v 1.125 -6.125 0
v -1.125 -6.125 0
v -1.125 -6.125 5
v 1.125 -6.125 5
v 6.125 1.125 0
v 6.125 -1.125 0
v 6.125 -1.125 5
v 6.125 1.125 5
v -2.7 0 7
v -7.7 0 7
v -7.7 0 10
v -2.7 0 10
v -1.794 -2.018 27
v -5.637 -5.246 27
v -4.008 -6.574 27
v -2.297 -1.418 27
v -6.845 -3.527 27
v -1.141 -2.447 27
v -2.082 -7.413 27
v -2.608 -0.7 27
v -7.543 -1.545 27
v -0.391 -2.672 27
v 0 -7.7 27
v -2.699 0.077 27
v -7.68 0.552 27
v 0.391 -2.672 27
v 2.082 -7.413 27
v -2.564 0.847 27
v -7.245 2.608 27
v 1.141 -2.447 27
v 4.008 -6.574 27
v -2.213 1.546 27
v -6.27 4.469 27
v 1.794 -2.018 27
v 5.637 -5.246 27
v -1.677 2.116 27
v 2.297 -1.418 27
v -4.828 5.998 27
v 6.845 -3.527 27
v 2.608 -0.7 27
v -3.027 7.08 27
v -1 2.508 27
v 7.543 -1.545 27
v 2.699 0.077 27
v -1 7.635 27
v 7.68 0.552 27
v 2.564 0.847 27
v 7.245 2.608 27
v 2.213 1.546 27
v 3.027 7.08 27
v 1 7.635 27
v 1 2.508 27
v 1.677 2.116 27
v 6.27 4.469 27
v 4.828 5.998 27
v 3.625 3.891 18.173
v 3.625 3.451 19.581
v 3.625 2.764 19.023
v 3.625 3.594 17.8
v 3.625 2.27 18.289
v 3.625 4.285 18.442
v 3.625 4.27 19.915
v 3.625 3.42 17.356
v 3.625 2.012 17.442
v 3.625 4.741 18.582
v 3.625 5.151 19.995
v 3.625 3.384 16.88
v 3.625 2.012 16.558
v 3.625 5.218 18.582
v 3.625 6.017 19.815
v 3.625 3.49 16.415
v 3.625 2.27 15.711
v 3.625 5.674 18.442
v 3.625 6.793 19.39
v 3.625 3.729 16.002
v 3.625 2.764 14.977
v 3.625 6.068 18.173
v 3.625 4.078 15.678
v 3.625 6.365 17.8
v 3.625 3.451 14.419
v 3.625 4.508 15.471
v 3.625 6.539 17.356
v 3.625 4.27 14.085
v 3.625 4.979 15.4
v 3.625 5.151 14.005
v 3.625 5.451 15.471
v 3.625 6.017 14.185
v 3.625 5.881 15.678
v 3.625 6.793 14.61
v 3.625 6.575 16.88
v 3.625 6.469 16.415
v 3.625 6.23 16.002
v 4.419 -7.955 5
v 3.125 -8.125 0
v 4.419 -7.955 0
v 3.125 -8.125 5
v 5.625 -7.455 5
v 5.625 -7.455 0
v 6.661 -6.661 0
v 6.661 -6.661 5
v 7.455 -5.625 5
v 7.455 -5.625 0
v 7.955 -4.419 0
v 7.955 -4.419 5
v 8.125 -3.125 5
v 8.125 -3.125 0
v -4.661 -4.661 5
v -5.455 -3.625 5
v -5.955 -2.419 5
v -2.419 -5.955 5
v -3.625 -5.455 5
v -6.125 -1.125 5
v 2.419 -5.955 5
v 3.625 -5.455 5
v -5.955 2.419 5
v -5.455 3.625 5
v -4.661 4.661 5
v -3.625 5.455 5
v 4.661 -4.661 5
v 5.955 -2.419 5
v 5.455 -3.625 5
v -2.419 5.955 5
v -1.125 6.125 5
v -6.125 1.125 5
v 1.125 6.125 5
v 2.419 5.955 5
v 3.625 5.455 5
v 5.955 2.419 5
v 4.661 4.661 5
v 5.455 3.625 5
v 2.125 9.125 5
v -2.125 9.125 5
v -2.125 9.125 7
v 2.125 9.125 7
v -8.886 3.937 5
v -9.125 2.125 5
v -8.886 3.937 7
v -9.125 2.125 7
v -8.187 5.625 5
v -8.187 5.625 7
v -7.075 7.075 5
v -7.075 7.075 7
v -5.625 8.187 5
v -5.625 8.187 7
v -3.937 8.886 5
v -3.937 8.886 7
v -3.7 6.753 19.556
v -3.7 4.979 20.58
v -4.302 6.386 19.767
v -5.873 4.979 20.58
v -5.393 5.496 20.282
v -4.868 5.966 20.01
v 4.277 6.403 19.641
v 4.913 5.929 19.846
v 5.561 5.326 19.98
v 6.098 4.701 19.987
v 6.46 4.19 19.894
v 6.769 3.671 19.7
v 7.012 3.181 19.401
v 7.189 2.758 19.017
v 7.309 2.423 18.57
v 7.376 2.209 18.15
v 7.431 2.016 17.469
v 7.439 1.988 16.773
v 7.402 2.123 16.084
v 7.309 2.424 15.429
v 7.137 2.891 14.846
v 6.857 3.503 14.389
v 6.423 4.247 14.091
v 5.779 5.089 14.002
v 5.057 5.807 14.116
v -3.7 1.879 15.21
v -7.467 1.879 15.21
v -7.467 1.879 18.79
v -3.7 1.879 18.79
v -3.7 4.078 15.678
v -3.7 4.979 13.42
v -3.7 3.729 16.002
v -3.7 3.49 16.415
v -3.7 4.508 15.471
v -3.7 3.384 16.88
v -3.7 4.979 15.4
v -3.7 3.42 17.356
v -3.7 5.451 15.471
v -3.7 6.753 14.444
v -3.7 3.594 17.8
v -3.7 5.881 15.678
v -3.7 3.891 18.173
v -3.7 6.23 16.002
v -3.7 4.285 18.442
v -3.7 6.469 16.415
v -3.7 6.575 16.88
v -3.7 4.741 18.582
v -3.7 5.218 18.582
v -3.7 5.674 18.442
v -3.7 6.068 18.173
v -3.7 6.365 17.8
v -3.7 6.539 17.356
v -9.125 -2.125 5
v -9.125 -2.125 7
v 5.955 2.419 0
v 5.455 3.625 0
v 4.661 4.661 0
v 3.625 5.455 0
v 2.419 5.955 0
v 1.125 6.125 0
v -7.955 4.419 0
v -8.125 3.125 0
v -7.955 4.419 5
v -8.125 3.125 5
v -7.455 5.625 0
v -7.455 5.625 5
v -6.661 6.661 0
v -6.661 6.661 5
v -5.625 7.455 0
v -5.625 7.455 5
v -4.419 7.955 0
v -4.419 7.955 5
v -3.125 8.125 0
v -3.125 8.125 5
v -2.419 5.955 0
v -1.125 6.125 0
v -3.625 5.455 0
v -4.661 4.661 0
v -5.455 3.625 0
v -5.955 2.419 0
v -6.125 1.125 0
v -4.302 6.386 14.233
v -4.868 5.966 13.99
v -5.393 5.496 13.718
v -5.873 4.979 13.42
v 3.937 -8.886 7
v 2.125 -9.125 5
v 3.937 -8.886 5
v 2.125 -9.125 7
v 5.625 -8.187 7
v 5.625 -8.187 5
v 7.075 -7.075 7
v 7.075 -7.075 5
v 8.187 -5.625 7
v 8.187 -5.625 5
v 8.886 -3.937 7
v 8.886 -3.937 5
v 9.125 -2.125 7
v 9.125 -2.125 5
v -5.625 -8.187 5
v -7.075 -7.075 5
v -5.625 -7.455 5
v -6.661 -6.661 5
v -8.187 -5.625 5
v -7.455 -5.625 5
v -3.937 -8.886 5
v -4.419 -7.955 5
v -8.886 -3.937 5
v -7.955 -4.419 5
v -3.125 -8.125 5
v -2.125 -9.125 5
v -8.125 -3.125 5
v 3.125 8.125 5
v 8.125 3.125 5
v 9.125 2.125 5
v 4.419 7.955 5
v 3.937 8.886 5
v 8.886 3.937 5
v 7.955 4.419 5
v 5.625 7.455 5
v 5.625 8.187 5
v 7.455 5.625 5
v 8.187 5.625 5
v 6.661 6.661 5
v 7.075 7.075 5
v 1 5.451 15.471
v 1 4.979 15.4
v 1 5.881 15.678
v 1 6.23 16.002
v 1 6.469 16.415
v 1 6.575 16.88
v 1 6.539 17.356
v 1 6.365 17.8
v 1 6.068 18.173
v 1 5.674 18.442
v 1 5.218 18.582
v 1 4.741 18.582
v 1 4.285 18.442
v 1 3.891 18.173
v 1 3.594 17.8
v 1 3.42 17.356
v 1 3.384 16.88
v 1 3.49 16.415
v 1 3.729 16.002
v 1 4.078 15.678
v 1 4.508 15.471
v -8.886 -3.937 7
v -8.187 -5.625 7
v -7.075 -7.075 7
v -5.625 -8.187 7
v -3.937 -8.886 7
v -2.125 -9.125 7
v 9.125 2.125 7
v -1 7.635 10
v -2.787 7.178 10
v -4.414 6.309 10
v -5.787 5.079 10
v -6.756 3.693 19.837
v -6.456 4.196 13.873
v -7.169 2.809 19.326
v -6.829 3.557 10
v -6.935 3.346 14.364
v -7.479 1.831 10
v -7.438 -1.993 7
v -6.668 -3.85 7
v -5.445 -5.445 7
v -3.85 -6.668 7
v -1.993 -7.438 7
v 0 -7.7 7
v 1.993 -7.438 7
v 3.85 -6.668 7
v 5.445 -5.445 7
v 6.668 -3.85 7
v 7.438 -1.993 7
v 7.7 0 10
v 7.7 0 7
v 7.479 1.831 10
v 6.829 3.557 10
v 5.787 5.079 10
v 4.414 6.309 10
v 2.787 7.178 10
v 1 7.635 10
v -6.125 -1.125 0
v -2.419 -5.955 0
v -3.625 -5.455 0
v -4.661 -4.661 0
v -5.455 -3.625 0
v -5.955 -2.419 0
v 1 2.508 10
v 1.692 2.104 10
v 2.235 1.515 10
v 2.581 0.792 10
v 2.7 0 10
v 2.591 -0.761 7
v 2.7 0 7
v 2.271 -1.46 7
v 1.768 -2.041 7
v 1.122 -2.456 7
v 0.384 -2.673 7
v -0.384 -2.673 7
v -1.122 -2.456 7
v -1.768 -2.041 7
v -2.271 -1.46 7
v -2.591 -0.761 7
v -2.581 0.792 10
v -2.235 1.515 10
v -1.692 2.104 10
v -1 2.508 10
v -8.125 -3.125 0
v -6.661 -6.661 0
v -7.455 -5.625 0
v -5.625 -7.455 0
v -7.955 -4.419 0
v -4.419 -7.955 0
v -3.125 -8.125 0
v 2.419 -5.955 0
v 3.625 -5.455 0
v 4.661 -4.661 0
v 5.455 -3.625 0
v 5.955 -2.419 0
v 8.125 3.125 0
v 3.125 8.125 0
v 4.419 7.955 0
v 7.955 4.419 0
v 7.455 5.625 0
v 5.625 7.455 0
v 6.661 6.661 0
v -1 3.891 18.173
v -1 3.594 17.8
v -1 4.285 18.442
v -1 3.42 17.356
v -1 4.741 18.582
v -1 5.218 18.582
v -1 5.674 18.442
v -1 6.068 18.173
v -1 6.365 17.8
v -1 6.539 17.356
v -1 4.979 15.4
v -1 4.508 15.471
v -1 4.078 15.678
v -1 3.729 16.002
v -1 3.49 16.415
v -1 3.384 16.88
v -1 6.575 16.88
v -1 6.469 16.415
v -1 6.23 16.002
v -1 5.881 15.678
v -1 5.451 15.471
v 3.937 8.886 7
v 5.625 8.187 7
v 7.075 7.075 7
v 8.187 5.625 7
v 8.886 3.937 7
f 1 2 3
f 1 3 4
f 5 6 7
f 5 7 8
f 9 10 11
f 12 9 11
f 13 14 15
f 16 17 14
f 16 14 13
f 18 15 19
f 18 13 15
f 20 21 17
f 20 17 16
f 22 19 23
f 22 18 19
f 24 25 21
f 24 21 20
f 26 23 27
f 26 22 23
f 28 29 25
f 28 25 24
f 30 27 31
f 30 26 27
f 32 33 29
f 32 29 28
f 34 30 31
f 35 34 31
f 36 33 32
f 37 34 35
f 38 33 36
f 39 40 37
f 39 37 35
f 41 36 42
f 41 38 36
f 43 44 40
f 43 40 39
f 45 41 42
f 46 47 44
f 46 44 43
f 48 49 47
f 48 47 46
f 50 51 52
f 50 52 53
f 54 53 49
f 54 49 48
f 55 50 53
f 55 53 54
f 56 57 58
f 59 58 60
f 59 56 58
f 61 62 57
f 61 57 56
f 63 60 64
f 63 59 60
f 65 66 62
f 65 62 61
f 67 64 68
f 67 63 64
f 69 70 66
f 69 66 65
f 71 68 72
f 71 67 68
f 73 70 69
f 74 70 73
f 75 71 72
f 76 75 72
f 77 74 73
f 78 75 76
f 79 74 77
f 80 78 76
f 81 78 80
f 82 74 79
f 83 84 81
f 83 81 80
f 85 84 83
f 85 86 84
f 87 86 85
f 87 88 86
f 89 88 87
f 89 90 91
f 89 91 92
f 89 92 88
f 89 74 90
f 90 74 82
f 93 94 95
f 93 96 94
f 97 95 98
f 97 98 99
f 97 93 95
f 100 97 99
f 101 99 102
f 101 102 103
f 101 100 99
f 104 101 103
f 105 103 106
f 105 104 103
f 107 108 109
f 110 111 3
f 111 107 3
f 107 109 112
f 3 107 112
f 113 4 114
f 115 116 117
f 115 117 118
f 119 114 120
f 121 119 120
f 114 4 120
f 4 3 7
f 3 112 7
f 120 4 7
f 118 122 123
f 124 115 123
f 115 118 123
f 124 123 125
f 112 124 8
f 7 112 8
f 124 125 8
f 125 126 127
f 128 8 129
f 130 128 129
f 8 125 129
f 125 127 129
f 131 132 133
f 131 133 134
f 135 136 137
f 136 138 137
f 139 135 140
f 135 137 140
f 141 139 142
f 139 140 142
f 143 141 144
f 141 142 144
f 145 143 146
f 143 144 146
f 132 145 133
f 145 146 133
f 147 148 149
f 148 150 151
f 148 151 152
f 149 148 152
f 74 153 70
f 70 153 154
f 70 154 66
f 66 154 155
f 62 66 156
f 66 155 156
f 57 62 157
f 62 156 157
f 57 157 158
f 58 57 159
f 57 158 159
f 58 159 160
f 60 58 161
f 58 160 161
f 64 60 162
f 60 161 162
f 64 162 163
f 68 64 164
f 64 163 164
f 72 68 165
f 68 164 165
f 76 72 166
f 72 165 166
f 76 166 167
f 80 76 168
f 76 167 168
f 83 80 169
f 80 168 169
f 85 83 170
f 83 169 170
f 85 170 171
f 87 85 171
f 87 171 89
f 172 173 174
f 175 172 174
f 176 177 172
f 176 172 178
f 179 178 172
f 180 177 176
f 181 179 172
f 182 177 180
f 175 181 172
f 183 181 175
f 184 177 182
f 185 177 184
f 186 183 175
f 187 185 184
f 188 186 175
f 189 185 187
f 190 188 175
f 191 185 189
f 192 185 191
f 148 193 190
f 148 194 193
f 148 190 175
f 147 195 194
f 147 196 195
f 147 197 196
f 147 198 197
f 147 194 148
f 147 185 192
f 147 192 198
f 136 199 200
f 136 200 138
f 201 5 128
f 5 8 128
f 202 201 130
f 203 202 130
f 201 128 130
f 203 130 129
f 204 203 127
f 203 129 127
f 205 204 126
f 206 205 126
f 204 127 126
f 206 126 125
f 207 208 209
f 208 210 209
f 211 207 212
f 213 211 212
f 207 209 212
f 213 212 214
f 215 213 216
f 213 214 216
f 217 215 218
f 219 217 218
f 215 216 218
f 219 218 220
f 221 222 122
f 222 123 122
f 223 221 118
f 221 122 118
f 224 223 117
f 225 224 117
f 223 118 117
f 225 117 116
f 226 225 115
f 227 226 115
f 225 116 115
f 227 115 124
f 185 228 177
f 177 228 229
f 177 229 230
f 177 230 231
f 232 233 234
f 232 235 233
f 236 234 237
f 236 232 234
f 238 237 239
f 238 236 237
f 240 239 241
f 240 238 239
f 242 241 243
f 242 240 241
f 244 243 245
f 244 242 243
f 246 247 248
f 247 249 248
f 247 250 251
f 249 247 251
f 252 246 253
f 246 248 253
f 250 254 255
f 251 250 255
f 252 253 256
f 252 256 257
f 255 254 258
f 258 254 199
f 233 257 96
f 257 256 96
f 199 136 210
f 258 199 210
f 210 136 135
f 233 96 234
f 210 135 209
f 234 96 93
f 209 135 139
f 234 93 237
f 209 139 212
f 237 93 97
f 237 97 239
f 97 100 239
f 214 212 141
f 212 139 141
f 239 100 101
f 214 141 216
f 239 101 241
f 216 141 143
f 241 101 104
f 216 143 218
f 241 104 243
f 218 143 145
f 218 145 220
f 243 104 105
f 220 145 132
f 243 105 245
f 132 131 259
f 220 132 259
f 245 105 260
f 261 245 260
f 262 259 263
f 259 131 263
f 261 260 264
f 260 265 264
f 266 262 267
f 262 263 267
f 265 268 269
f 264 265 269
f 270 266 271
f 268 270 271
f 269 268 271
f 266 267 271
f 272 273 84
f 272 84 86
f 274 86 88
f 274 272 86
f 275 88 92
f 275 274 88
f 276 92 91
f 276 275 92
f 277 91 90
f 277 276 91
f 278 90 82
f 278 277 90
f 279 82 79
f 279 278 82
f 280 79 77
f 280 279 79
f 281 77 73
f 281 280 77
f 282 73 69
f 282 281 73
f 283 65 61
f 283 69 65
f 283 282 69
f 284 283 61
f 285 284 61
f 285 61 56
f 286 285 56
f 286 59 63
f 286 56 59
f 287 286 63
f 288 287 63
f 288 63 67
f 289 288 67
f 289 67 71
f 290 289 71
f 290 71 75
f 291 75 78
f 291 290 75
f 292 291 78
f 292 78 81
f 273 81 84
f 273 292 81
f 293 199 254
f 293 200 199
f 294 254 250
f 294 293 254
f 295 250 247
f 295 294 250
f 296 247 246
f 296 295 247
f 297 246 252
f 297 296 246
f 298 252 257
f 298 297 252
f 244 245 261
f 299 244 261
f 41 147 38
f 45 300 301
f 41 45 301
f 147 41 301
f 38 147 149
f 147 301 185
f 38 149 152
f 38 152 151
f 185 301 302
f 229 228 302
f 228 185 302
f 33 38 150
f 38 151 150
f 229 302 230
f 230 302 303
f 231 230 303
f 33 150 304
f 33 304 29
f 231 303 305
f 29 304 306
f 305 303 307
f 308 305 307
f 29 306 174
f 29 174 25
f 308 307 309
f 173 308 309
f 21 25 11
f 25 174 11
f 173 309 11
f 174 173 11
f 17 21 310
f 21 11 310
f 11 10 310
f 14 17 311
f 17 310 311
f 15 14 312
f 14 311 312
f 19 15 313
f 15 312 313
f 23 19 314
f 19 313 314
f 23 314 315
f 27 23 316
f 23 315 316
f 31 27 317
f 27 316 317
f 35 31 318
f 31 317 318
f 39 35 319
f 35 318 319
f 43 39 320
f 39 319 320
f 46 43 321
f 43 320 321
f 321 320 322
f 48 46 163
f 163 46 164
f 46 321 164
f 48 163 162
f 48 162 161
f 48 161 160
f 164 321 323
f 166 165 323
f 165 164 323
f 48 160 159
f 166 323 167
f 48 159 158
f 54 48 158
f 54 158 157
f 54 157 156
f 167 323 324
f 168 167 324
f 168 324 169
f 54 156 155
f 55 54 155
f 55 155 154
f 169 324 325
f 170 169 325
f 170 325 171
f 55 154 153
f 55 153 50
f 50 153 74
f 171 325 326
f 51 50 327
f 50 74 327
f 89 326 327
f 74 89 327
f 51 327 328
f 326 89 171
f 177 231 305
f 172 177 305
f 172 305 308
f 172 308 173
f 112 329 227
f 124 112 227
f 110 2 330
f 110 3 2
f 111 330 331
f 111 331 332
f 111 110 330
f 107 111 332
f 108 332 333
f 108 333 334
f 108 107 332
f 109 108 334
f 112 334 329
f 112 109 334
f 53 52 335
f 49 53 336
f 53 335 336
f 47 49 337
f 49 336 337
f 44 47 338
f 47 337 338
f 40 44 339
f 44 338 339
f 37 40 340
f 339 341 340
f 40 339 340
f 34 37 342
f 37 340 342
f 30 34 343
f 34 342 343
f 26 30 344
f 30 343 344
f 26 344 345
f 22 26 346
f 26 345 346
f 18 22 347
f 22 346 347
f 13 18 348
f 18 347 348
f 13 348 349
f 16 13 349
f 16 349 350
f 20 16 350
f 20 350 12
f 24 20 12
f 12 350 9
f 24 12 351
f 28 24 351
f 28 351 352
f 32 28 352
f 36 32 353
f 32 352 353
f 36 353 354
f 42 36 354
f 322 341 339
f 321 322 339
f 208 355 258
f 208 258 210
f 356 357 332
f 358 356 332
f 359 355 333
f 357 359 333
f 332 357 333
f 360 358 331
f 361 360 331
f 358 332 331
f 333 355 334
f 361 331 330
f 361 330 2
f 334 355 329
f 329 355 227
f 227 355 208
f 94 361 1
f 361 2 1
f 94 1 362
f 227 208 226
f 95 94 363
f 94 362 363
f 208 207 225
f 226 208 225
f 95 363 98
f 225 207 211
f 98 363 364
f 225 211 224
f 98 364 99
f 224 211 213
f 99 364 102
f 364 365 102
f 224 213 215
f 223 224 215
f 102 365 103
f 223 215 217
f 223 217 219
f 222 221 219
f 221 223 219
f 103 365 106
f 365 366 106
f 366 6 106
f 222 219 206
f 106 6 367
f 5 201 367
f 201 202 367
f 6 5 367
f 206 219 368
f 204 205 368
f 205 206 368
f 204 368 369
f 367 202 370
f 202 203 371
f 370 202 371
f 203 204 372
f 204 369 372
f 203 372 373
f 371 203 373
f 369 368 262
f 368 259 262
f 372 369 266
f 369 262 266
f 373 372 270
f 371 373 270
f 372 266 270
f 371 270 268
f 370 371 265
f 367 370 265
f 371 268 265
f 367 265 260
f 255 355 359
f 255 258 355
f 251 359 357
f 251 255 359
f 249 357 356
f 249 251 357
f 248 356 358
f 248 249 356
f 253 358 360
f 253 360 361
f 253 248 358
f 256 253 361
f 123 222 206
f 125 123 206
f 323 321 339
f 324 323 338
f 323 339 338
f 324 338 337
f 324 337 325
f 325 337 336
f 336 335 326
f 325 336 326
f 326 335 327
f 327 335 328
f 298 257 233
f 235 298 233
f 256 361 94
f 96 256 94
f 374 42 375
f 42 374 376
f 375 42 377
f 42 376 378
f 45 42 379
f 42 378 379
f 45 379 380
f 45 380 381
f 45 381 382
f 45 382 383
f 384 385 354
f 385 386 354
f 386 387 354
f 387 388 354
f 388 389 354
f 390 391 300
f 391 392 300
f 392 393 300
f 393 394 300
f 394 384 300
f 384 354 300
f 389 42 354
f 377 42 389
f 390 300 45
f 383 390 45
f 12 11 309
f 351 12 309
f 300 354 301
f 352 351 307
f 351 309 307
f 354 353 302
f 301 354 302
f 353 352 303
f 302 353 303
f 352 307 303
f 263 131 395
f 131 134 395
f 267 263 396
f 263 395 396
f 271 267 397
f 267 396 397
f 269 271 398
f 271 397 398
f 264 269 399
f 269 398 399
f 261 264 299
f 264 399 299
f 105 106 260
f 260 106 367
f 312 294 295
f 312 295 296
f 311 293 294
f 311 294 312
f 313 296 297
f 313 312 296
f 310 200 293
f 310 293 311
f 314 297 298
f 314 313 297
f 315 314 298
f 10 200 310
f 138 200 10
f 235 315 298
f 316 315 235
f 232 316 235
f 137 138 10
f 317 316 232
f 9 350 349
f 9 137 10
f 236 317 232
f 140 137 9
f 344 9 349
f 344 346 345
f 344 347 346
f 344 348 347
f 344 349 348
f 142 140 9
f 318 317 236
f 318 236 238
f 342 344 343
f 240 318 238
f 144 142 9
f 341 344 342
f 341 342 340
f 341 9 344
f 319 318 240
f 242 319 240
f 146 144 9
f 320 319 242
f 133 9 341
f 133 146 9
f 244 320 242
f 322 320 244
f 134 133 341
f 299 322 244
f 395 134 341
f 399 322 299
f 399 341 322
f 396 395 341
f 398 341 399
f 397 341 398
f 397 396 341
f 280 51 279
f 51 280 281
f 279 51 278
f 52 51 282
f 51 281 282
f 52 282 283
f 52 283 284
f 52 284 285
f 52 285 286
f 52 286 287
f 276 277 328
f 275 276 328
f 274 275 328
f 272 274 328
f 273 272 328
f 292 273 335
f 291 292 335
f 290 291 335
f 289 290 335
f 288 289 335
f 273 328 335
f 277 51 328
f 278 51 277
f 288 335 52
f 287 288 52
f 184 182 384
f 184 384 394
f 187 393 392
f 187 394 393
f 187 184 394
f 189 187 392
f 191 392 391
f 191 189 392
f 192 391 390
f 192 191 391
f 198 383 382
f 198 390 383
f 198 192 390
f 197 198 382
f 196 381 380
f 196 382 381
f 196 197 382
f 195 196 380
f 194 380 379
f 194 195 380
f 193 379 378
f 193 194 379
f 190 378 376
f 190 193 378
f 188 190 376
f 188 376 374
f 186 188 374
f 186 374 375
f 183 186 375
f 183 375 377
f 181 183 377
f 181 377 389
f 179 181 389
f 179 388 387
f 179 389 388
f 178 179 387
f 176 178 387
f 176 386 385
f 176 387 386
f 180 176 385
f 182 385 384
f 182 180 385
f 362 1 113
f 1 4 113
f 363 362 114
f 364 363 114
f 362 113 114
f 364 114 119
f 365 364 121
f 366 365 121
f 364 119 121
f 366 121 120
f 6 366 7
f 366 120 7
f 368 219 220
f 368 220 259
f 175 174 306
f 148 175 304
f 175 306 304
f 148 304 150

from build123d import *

# Parameters (mm, degrees)
SKETCH1_W               = 16.25
SKETCH1_H               = 16.25
SKETCH1_W_2             = 12.25
SKETCH1_H_2             = 12.25
BOSS_EXTRUDE1_DEPTH     = 5
FILLET1_R               = 5
SKETCH2_W               = 18.25
SKETCH2_H               = 18.25
BOSS_EXTRUDE2_DEPTH     = 2
FILLET2_R               = 7
BOSS_EXTRUDE3_DEPTH     = 20
CUT_EXTRUDE1_DEPTH      = 30.925428151
CUT_EXTRUDE1_DEPTH_BACK = 30.925428151
SKETCH5_R               = 1.6
SKETCH7_R               = 3
CUT_EXTRUDE2_DEPTH      = 5.5
CUT_EXTRUDE3_DEPTH      = 4
SKETCH9_W               = 3
SKETCH9_H               = 10.743898354
CUT_EXTRUDE4_DEPTH      = 34.096015703


with BuildPart() as part:
    # Sketch1 → Boss-Extrude1 (new body)
    with BuildSketch(Plane.XY):
        Rectangle(SKETCH1_W, SKETCH1_H)
        Rectangle(SKETCH1_W_2, SKETCH1_H_2, mode=Mode.SUBTRACT)
    extrude(amount=BOSS_EXTRUDE1_DEPTH)

    # Fillet1
    fillet1_edges = [part.edges().sort_by_distance(p)[0] for p in [
        (6.125, -6.125, 2.5),
        (6.125, 6.125, 2.5),
        (-6.125, 6.125, 2.5),
        (-6.125, -6.125, 2.5),
        (-8.125, 8.125, 2.5),
        (8.125, 8.125, 2.5),
        (8.125, -8.125, 2.5),
        (-8.125, -8.125, 2.5),
    ]]
    fillet(fillet1_edges, radius=FILLET1_R)

    # Sketch2 → Boss-Extrude2 (add)
    with BuildSketch(Plane.XY.offset(5)):
        Rectangle(SKETCH2_W, SKETCH2_H)
    extrude(amount=BOSS_EXTRUDE2_DEPTH)

    # Fillet2
    fillet2_edges = [part.edges().sort_by_distance(p)[0] for p in [
        (-9.125, 9.125, 6),
        (-9.125, -9.125, 6),
        (9.125, -9.125, 6),
        (9.125, 9.125, 6),
    ]]
    fillet(fillet2_edges, radius=FILLET2_R)

    # Sketch3 → Boss-Extrude3 (add)
    with BuildSketch(Plane.XY.offset(7)):
        with BuildLine():
            Line((1, 7.634788799), (1, 2.507987241))
            ThreePointArc((1, 2.507987241), (0, -2.7), (-1, 2.507987241))
            Line((-1, 2.507987241), (-1, 7.634788799))
            ThreePointArc((-1, 7.634788799), (0, -7.7), (1, 7.634788799))
        make_face()
    extrude(amount=BOSS_EXTRUDE3_DEPTH)

    # Sketch5 → Cut-Extrude1 (cut, two sides: drawn at the far end of the back side and taken through both)
    with BuildSketch(Plane(origin=(0, 0, 0), x_dir=(0, 0, -1), z_dir=(1, 0, 0)).offset(-CUT_EXTRUDE1_DEPTH_BACK)):
        with Locations((-17, 4.979474194)):
            Circle(SKETCH5_R)
    extrude(amount=CUT_EXTRUDE1_DEPTH + CUT_EXTRUDE1_DEPTH_BACK, mode=Mode.SUBTRACT)

    # Sketch7 → Cut-Extrude2 (cut)
    with BuildSketch(Plane(origin=(9.125, 0, 0), x_dir=(0, 0, -1), z_dir=(1, 0, 0))):
        with Locations((-17, 4.979474194)):
            Circle(SKETCH7_R)
    extrude(amount=-CUT_EXTRUDE2_DEPTH, mode=Mode.SUBTRACT)

    # Sketch8 → Cut-Extrude3 (cut)
    with BuildSketch(Plane.ZY.offset(7.7)):
        Polygon((13.420428331, 4.979474194), (15.210214166, 1.879474194), (18.789785834, 1.879474194), (20.579571669, 4.979474194), (18.789785834, 8.079474194), (15.210214166, 8.079474194), align=None)
    extrude(amount=-CUT_EXTRUDE3_DEPTH, mode=Mode.SUBTRACT)

    # Sketch9 → Cut-Extrude4 (cut, through all)
    with BuildSketch(Plane.ZY.offset(7.7)):
        with Locations((8.5, 5.371949177)):
            Rectangle(SKETCH9_W, SKETCH9_H)
    extrude(amount=-CUT_EXTRUDE4_DEPTH, mode=Mode.SUBTRACT)


solid = part.part
